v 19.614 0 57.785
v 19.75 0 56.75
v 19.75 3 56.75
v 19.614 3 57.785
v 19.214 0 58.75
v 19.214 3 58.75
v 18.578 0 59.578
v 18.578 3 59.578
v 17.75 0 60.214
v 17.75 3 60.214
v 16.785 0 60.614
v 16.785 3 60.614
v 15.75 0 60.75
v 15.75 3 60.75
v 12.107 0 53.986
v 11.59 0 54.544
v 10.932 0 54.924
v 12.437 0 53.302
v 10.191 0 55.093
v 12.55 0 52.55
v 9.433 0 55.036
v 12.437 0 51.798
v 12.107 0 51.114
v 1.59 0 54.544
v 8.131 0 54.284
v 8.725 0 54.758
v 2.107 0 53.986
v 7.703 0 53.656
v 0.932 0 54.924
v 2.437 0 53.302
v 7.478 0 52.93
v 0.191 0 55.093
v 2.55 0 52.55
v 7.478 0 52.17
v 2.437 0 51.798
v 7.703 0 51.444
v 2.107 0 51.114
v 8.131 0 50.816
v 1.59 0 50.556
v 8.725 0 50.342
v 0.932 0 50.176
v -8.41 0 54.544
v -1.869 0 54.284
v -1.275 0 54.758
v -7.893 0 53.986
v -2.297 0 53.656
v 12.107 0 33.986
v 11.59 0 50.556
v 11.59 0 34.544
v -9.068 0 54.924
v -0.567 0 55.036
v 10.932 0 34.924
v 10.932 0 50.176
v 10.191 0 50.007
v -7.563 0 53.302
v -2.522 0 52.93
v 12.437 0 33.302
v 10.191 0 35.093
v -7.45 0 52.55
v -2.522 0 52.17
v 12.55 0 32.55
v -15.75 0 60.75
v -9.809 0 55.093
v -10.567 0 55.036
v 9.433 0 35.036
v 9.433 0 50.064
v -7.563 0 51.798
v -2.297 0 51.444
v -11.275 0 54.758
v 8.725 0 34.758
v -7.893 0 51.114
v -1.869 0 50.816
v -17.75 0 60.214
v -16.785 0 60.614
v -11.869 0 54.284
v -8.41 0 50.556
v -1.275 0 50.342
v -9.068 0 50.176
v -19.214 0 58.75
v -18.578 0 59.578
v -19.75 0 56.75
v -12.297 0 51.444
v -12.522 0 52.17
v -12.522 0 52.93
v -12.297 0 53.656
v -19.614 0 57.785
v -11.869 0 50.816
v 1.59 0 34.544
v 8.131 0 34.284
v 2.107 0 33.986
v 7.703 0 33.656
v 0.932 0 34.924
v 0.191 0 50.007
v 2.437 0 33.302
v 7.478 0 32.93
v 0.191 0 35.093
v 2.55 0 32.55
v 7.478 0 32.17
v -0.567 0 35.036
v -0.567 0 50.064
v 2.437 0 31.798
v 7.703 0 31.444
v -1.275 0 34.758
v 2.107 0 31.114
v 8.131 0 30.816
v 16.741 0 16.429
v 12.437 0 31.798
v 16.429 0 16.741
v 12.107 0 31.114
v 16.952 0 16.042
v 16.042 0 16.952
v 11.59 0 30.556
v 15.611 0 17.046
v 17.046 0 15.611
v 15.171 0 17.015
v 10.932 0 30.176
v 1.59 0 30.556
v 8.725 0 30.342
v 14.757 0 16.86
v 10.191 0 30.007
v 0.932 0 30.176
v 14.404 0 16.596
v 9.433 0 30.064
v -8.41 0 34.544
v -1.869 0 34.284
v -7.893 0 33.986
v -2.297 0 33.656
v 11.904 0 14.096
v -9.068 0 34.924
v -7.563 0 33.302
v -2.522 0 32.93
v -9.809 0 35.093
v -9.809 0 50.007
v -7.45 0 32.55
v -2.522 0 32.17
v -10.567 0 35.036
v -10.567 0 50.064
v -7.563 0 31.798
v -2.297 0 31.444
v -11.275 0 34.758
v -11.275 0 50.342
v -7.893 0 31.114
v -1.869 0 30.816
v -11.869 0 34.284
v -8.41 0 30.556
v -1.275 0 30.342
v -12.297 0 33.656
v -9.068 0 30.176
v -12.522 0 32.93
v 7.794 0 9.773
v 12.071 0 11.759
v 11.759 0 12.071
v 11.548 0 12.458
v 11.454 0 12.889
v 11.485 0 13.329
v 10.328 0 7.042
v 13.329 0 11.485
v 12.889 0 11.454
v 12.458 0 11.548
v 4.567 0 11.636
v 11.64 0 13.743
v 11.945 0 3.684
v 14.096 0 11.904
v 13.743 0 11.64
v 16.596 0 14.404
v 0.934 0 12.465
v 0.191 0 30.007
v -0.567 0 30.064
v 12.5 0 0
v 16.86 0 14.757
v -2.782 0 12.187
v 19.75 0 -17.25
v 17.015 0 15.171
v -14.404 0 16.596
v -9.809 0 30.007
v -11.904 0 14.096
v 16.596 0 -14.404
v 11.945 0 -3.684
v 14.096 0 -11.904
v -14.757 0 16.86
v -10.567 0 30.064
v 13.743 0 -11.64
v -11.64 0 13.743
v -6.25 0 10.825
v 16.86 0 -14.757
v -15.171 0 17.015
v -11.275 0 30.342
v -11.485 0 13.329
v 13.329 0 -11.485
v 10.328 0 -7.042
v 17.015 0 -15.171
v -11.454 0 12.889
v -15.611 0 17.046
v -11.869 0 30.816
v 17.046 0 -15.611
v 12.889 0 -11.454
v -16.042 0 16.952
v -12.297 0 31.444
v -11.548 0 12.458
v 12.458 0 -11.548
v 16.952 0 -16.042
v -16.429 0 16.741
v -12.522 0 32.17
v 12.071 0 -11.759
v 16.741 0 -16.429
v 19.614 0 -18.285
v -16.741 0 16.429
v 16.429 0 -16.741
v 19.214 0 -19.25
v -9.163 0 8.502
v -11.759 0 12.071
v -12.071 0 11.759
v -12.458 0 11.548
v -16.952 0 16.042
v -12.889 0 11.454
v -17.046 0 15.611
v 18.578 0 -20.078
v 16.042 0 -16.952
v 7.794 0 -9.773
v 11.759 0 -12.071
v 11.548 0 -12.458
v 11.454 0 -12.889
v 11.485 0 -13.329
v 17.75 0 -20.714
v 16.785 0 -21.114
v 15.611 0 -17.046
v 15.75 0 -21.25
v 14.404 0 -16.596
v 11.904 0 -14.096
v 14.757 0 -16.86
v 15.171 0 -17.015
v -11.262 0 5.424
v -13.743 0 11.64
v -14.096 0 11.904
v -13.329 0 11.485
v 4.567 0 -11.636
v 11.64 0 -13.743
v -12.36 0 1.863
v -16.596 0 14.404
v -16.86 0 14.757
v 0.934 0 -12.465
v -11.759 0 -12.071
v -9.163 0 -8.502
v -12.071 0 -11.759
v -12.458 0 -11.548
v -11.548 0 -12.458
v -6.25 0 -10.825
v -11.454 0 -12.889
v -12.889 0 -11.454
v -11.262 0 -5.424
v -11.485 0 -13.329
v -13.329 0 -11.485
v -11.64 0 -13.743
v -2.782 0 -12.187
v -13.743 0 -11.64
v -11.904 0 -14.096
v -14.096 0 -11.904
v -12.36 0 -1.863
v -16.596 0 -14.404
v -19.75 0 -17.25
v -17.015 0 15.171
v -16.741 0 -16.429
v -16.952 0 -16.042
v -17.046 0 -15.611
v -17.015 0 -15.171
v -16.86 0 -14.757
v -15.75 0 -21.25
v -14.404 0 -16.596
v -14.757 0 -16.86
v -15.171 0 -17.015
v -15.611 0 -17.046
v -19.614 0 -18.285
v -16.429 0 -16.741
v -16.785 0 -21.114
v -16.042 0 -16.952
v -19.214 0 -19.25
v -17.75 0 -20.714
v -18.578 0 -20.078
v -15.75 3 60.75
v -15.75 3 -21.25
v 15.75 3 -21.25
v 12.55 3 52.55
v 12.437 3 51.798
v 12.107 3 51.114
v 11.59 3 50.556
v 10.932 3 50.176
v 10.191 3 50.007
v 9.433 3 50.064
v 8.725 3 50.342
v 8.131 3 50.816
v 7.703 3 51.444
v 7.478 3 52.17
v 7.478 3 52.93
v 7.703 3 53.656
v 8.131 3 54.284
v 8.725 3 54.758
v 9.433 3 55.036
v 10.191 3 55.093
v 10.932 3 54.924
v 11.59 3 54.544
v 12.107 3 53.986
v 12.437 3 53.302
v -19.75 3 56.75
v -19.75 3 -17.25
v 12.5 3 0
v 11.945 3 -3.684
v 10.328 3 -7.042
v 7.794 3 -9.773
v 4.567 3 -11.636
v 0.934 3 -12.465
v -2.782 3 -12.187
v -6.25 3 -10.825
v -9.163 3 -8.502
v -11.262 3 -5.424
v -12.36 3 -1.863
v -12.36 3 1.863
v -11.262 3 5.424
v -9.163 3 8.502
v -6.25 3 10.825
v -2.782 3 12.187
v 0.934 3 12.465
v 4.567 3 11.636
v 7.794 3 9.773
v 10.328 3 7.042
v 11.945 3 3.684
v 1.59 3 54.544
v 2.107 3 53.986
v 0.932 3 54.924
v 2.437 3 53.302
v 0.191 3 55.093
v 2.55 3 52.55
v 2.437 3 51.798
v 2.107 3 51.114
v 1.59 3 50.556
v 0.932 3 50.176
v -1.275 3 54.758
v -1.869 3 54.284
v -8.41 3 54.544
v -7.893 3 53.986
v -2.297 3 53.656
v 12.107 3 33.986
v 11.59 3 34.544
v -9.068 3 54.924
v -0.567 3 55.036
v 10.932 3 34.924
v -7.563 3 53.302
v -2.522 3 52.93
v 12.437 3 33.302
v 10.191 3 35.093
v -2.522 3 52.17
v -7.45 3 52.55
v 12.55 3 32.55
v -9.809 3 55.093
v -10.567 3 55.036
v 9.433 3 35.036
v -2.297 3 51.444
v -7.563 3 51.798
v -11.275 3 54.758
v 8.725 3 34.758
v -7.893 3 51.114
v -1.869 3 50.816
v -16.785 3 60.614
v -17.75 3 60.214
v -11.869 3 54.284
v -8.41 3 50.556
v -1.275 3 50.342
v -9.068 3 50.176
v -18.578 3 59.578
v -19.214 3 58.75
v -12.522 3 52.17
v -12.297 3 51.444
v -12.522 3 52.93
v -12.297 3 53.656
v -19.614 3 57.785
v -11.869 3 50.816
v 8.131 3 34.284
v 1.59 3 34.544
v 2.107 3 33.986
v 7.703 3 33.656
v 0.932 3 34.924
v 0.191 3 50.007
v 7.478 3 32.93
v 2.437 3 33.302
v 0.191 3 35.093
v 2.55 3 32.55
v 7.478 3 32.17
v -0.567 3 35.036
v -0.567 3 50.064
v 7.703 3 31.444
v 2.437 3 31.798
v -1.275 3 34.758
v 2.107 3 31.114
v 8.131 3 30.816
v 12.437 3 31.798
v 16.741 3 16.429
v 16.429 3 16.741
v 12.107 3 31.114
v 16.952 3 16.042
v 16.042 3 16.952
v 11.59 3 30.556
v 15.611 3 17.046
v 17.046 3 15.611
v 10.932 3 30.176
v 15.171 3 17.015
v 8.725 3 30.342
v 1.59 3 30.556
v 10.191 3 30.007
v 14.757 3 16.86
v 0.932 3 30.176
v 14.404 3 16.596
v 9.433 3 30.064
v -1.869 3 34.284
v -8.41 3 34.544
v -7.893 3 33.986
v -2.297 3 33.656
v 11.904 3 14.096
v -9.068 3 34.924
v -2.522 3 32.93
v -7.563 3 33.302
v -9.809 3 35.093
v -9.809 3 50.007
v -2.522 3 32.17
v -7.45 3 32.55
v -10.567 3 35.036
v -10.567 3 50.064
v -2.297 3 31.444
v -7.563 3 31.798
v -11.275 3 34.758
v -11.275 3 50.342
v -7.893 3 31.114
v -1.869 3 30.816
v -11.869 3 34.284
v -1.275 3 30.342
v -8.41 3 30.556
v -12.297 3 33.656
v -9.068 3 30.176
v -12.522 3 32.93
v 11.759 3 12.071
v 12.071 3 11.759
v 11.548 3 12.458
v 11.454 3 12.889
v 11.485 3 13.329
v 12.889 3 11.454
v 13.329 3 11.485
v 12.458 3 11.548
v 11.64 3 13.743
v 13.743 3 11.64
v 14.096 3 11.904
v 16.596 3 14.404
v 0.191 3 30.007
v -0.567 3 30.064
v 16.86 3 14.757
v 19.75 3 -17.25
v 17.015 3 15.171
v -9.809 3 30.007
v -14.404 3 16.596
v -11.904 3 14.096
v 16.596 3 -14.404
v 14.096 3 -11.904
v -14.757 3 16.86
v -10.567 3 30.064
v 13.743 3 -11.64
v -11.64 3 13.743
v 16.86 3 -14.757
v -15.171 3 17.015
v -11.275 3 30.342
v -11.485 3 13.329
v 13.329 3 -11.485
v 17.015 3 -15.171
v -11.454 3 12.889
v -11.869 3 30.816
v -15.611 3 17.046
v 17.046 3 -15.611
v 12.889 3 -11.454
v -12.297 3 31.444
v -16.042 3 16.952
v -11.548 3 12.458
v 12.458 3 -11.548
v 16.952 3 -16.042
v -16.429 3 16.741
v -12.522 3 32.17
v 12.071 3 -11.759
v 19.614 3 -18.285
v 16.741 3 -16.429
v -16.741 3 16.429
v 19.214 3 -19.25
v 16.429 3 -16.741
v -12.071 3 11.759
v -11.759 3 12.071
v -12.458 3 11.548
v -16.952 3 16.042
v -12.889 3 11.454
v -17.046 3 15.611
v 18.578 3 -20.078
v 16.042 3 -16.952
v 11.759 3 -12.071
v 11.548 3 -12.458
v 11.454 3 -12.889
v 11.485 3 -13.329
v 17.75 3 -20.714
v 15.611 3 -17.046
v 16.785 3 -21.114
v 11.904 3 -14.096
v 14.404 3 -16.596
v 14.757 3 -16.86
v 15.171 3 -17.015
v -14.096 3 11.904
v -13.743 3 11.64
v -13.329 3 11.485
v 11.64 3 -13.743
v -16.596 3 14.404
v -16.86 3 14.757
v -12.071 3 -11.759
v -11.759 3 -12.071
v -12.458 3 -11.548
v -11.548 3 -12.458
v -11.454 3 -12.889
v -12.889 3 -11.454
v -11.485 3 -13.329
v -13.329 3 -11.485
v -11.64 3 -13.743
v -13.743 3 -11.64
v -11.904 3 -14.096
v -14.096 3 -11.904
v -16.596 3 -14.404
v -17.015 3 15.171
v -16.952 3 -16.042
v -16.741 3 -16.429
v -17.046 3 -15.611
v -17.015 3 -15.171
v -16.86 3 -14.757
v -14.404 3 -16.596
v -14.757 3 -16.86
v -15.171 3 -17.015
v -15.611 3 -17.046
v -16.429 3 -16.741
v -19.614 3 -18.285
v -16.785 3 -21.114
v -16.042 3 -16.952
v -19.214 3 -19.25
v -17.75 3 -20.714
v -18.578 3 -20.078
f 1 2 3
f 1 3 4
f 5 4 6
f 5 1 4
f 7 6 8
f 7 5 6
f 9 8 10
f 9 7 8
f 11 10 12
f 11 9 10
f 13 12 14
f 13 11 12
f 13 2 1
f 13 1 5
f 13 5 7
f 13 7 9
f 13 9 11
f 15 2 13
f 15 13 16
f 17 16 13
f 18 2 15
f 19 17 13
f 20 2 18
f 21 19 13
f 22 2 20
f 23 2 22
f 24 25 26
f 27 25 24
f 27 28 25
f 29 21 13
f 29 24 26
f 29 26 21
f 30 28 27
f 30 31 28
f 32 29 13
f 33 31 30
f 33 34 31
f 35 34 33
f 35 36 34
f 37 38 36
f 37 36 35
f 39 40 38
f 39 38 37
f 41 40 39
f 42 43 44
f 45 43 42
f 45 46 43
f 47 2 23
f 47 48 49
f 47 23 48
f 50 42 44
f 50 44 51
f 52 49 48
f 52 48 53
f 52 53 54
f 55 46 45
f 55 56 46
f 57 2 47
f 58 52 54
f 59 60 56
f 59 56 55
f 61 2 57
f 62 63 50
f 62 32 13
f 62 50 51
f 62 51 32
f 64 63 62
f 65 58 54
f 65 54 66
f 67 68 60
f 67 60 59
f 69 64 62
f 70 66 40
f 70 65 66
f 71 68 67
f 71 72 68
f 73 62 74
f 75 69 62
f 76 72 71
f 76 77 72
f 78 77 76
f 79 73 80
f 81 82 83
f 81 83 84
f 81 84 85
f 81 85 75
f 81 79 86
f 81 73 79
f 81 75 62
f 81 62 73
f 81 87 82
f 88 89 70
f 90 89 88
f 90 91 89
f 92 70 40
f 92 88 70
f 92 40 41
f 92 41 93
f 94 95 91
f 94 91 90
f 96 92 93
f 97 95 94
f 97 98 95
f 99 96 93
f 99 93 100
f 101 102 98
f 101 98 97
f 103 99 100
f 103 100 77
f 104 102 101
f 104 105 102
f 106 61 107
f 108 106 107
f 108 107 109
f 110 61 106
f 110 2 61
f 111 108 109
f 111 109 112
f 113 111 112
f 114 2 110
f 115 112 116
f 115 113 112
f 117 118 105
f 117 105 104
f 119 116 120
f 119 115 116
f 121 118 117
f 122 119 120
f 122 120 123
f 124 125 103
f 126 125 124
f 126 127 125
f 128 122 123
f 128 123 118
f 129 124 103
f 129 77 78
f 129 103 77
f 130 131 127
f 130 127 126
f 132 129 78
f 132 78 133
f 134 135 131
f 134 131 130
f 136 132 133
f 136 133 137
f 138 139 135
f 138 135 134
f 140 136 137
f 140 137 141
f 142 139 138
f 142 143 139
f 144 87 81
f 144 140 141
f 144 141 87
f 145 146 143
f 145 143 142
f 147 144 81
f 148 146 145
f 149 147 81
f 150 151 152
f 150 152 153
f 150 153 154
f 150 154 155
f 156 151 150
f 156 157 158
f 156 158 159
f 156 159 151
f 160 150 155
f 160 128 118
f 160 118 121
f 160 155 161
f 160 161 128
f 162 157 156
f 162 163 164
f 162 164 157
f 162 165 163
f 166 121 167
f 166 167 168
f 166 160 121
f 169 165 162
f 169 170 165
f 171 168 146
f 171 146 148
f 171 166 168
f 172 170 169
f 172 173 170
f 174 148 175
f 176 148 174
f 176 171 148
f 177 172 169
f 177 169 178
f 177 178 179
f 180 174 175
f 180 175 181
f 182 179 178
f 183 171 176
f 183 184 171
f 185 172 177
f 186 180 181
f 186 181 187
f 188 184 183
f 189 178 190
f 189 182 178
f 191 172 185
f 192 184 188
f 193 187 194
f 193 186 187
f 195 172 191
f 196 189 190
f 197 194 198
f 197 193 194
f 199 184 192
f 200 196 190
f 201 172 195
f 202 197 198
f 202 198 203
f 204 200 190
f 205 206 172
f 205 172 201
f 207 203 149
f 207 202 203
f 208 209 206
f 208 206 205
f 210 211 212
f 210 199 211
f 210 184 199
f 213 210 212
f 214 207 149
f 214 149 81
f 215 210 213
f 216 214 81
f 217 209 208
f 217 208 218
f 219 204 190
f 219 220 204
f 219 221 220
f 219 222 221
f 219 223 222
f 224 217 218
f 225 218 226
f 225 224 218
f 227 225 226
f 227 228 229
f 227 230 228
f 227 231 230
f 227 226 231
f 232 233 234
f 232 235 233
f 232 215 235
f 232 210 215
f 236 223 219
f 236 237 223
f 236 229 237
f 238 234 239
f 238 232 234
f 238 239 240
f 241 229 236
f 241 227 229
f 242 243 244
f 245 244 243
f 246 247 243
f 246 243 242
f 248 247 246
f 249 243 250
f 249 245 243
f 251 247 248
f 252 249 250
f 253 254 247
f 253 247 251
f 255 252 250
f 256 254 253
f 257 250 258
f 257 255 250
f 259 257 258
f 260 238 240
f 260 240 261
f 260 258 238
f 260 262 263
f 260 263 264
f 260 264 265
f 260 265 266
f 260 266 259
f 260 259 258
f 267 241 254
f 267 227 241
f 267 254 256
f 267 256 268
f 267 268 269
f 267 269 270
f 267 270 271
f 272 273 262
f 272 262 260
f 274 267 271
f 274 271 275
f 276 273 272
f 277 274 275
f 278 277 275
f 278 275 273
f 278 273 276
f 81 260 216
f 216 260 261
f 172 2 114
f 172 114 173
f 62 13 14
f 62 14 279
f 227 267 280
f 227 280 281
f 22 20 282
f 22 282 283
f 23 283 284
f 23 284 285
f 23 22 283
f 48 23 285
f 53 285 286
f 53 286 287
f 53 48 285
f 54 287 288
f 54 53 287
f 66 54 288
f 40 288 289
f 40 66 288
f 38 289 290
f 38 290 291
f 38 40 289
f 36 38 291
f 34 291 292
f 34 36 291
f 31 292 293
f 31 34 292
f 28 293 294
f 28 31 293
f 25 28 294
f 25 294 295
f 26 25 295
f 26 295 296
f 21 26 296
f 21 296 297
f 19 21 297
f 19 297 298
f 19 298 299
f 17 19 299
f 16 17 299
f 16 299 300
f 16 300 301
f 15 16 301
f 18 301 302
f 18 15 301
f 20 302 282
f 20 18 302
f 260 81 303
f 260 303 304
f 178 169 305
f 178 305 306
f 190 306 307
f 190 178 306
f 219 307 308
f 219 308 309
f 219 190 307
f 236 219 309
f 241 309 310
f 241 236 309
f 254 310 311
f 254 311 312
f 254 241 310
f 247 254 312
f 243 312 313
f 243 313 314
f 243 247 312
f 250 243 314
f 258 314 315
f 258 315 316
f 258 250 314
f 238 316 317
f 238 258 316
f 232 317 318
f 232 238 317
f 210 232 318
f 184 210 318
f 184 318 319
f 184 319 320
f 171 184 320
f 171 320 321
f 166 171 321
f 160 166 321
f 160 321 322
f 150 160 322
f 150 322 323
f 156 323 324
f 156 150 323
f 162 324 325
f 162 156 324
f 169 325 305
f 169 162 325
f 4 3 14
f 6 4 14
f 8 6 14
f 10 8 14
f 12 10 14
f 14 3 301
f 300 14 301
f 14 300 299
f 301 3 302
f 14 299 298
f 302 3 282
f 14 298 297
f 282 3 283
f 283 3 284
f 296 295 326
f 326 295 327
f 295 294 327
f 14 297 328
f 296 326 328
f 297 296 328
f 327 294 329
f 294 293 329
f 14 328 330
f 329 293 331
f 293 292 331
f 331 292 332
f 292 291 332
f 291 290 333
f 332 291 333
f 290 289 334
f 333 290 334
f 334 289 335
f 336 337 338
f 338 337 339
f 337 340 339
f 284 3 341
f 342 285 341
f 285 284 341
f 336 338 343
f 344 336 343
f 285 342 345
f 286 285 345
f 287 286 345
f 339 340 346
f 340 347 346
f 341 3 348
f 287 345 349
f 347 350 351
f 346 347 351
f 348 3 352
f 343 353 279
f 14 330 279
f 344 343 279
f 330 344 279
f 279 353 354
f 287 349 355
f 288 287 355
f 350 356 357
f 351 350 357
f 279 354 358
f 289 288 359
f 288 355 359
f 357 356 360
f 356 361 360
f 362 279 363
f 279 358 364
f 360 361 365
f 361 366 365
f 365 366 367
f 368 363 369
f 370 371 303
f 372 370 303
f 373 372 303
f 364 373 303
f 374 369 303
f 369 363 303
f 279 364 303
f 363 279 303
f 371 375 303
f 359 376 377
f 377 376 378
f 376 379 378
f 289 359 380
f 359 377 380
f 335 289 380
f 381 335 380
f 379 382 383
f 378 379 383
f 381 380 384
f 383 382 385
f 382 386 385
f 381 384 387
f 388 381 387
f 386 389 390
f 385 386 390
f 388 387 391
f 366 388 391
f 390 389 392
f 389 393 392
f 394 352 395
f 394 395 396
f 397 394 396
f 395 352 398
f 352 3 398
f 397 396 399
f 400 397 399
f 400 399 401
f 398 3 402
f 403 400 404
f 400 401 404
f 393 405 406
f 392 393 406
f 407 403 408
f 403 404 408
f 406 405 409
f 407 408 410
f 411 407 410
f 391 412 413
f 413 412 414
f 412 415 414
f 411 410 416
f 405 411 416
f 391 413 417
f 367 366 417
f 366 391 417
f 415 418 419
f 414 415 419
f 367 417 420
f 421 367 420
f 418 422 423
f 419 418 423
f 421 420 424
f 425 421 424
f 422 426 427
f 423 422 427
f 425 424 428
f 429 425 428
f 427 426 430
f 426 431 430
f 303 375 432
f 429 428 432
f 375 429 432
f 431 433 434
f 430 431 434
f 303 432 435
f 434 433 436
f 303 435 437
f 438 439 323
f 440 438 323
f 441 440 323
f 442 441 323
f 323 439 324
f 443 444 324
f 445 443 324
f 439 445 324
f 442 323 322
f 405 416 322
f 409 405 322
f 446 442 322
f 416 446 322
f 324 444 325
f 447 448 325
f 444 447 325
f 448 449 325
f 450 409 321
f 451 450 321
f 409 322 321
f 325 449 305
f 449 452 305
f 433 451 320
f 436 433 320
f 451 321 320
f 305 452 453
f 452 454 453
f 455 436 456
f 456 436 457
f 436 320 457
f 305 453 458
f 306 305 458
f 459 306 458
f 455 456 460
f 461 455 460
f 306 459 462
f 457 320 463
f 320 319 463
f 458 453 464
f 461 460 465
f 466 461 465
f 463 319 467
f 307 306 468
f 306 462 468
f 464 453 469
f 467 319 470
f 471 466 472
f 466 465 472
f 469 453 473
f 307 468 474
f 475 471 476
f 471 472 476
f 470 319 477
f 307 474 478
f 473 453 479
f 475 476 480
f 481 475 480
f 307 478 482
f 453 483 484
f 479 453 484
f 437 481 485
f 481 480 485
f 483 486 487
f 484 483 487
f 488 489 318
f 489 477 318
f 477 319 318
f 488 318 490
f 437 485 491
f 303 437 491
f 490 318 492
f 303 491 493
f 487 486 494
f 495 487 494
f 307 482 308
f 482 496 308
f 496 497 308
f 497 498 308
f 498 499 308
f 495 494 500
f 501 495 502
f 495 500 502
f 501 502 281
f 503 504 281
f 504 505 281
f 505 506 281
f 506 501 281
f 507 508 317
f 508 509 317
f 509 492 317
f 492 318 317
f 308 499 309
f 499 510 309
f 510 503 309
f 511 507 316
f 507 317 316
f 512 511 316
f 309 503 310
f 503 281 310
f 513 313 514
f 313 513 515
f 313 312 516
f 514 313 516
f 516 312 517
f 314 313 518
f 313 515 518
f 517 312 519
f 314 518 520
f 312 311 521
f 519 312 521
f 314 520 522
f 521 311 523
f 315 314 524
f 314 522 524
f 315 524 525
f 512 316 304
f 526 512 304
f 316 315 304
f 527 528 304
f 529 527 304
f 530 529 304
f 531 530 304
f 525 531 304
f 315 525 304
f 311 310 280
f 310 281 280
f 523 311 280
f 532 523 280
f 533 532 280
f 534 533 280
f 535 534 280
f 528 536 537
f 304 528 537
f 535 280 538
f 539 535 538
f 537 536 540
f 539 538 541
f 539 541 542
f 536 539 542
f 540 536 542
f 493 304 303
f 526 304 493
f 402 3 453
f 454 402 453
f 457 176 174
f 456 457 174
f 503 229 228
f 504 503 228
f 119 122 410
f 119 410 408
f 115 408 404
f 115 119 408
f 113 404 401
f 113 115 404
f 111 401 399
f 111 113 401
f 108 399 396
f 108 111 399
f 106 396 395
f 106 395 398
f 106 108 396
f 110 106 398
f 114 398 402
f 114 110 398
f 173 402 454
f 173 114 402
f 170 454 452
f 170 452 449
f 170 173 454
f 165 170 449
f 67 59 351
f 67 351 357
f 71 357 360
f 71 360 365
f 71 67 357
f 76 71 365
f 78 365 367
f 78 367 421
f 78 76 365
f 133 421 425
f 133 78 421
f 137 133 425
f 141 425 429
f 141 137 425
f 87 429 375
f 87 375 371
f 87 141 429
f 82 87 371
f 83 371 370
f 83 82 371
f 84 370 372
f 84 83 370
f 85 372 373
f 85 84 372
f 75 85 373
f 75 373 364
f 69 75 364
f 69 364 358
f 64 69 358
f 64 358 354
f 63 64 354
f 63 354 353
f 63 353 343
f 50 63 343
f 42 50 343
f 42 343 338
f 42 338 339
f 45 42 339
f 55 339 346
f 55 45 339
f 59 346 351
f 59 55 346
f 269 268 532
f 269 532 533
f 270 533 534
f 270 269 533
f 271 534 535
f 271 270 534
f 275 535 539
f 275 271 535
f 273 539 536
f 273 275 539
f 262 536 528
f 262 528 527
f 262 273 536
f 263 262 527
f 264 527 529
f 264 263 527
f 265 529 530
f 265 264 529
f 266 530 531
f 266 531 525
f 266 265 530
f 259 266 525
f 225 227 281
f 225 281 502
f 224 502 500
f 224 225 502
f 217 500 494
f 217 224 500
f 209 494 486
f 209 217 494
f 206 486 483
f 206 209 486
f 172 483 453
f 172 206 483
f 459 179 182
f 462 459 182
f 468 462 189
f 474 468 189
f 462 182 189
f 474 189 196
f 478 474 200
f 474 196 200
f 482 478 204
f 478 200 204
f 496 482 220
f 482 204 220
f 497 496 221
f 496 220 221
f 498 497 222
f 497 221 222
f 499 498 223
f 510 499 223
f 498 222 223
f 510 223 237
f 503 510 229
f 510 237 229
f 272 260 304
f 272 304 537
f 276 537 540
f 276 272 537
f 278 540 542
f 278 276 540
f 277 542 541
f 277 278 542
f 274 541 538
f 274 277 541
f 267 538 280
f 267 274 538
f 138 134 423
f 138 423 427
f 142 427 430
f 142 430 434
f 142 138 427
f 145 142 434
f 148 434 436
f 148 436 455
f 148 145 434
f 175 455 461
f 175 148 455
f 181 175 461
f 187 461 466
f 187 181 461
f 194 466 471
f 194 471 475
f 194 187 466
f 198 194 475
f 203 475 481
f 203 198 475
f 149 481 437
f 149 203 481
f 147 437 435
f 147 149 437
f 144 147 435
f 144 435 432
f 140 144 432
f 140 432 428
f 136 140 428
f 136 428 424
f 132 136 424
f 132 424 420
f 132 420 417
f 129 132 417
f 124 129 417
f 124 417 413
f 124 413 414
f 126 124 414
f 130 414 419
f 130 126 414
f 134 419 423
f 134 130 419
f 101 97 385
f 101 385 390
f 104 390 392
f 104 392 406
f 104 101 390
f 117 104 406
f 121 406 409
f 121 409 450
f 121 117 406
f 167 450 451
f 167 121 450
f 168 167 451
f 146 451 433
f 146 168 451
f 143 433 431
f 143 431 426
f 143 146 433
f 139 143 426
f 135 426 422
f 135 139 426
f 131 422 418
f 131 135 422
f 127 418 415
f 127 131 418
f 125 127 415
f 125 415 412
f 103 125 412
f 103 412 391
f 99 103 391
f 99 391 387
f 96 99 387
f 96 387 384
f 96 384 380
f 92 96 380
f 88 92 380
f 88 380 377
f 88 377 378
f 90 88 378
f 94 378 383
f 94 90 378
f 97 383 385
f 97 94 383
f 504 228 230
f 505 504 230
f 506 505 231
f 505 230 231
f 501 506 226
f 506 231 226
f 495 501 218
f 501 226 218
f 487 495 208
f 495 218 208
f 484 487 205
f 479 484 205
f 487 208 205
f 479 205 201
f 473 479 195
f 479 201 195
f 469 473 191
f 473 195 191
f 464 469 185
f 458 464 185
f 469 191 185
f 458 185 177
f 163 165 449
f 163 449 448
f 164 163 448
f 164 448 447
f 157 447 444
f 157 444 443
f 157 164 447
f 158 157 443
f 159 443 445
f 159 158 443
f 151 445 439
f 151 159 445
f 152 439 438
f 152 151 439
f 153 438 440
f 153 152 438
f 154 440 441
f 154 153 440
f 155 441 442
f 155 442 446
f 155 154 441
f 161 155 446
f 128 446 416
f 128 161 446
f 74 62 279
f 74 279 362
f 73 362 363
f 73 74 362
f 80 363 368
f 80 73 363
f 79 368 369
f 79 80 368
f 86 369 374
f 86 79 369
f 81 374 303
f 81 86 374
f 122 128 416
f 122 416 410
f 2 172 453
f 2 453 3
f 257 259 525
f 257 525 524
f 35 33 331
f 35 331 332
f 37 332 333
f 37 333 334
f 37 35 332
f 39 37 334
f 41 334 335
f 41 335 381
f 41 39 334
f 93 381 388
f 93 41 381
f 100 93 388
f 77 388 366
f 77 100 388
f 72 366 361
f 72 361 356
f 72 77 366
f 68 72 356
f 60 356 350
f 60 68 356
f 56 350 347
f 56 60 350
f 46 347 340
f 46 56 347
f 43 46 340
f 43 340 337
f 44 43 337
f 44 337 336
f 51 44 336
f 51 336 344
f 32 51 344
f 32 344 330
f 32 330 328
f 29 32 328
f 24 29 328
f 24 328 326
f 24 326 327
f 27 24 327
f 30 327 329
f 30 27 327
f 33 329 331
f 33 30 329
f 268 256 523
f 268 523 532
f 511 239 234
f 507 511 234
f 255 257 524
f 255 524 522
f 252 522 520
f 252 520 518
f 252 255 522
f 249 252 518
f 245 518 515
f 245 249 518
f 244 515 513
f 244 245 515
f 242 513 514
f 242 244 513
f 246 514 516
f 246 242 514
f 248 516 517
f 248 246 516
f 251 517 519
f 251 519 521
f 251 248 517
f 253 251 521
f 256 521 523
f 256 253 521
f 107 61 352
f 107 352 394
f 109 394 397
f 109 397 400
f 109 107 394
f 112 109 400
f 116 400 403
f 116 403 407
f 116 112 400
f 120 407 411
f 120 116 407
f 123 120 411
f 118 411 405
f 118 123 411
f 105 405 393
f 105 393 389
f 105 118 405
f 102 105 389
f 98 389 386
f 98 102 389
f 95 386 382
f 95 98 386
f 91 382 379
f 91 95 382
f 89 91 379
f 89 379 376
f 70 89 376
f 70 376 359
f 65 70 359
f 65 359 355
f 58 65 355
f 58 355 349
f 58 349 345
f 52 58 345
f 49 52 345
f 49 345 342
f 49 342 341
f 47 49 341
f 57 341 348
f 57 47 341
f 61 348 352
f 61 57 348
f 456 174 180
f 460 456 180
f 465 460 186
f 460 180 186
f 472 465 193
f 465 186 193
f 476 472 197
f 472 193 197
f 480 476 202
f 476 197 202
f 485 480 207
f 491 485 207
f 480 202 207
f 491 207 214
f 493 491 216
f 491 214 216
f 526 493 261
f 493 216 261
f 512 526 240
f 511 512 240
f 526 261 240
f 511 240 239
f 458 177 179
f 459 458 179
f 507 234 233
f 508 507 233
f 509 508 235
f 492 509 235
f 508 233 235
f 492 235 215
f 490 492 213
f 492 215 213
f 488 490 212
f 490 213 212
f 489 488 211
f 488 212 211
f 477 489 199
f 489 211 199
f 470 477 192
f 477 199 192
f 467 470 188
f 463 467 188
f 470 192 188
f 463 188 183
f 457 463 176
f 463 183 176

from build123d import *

# Parameters (mm, degrees)
SKETCH1_R           = 12.5
SKETCH1_R_2         = 2.55
BOSS_EXTRUDE1_DEPTH = 3


with BuildPart() as part:
    # Sketch1 → Boss-Extrude1 (new body)
    with BuildSketch(Plane(origin=(0, 0, 0), x_dir=(1, 0, 0), z_dir=(0, 1, 0))):
        with BuildLine():
            Line((15.75, -60.75), (-15.75, -60.75))
            ThreePointArc((-15.75, -60.75), (-18.578427125, -59.578427125), (-19.75, -56.75))
            Line((-19.75, -56.75), (-19.75, 17.25))
            ThreePointArc((-19.75, 17.25), (-18.578427125, 20.078427125), (-15.75, 21.25))
            Line((-15.75, 21.25), (15.75, 21.25))
            ThreePointArc((15.75, 21.25), (18.578427125, 20.078427125), (19.75, 17.25))
            Line((19.75, 17.25), (19.75, -56.75))
            ThreePointArc((19.75, -56.75), (18.578427125, -59.578427125), (15.75, -60.75))
        make_face()
        Circle(SKETCH1_R, mode=Mode.SUBTRACT)
        with Locations((10, -52.55)):
            Circle(SKETCH1_R_2, mode=Mode.SUBTRACT)
        with Locations((10, -32.55)):
            Circle(SKETCH1_R_2, mode=Mode.SUBTRACT)
        with Locations((0, -52.55)):
            Circle(SKETCH1_R_2, mode=Mode.SUBTRACT)
        with Locations((0, -32.55)):
            Circle(SKETCH1_R_2, mode=Mode.SUBTRACT)
        with Locations((-10, -52.55)):
            Circle(SKETCH1_R_2, mode=Mode.SUBTRACT)
        with Locations((-10, -32.55)):
            Circle(SKETCH1_R_2, mode=Mode.SUBTRACT)
        with BuildLine():
            Line((11.903984489, 14.096015511), (14.403984489, 16.596015511))
            ThreePointArc((14.403984489, 16.596015511), (16.596015511, 16.596015511), (16.596015511, 14.403984489))
            Line((16.596015511, 14.403984489), (14.096015511, 11.903984489))
            ThreePointArc((14.096015511, 11.903984489), (11.903984489, 11.903984489), (11.903984489, 14.096015511))
        make_face(mode=Mode.SUBTRACT)
        with BuildLine():
            Line((-11.903984489, 14.096015511), (-14.403984489, 16.596015511))
            ThreePointArc((-14.403984489, 16.596015511), (-16.596015511, 16.596015511), (-16.596015511, 14.403984489))
            Line((-16.596015511, 14.403984489), (-14.096015511, 11.903984489))
            ThreePointArc((-14.096015511, 11.903984489), (-11.903984489, 11.903984489), (-11.903984489, 14.096015511))
        make_face(mode=Mode.SUBTRACT)
        with BuildLine():
            Line((-11.903984489, -14.096015511), (-14.403984489, -16.596015511))
            ThreePointArc((-14.403984489, -16.596015511), (-16.596015511, -16.596015511), (-16.596015511, -14.403984489))
            Line((-16.596015511, -14.403984489), (-14.096015511, -11.903984489))
            ThreePointArc((-14.096015511, -11.903984489), (-11.903984489, -11.903984489), (-11.903984489, -14.096015511))
        make_face(mode=Mode.SUBTRACT)
        with BuildLine():
            Line((11.903984489, -14.096015511), (14.403984489, -16.596015511))
            ThreePointArc((14.403984489, -16.596015511), (16.596015511, -16.596015511), (16.596015511, -14.403984489))
            Line((16.596015511, -14.403984489), (14.096015511, -11.903984489))
            ThreePointArc((14.096015511, -11.903984489), (11.903984489, -11.903984489), (11.903984489, -14.096015511))
        make_face(mode=Mode.SUBTRACT)
    extrude(amount=BOSS_EXTRUDE1_DEPTH)


solid = part.part
